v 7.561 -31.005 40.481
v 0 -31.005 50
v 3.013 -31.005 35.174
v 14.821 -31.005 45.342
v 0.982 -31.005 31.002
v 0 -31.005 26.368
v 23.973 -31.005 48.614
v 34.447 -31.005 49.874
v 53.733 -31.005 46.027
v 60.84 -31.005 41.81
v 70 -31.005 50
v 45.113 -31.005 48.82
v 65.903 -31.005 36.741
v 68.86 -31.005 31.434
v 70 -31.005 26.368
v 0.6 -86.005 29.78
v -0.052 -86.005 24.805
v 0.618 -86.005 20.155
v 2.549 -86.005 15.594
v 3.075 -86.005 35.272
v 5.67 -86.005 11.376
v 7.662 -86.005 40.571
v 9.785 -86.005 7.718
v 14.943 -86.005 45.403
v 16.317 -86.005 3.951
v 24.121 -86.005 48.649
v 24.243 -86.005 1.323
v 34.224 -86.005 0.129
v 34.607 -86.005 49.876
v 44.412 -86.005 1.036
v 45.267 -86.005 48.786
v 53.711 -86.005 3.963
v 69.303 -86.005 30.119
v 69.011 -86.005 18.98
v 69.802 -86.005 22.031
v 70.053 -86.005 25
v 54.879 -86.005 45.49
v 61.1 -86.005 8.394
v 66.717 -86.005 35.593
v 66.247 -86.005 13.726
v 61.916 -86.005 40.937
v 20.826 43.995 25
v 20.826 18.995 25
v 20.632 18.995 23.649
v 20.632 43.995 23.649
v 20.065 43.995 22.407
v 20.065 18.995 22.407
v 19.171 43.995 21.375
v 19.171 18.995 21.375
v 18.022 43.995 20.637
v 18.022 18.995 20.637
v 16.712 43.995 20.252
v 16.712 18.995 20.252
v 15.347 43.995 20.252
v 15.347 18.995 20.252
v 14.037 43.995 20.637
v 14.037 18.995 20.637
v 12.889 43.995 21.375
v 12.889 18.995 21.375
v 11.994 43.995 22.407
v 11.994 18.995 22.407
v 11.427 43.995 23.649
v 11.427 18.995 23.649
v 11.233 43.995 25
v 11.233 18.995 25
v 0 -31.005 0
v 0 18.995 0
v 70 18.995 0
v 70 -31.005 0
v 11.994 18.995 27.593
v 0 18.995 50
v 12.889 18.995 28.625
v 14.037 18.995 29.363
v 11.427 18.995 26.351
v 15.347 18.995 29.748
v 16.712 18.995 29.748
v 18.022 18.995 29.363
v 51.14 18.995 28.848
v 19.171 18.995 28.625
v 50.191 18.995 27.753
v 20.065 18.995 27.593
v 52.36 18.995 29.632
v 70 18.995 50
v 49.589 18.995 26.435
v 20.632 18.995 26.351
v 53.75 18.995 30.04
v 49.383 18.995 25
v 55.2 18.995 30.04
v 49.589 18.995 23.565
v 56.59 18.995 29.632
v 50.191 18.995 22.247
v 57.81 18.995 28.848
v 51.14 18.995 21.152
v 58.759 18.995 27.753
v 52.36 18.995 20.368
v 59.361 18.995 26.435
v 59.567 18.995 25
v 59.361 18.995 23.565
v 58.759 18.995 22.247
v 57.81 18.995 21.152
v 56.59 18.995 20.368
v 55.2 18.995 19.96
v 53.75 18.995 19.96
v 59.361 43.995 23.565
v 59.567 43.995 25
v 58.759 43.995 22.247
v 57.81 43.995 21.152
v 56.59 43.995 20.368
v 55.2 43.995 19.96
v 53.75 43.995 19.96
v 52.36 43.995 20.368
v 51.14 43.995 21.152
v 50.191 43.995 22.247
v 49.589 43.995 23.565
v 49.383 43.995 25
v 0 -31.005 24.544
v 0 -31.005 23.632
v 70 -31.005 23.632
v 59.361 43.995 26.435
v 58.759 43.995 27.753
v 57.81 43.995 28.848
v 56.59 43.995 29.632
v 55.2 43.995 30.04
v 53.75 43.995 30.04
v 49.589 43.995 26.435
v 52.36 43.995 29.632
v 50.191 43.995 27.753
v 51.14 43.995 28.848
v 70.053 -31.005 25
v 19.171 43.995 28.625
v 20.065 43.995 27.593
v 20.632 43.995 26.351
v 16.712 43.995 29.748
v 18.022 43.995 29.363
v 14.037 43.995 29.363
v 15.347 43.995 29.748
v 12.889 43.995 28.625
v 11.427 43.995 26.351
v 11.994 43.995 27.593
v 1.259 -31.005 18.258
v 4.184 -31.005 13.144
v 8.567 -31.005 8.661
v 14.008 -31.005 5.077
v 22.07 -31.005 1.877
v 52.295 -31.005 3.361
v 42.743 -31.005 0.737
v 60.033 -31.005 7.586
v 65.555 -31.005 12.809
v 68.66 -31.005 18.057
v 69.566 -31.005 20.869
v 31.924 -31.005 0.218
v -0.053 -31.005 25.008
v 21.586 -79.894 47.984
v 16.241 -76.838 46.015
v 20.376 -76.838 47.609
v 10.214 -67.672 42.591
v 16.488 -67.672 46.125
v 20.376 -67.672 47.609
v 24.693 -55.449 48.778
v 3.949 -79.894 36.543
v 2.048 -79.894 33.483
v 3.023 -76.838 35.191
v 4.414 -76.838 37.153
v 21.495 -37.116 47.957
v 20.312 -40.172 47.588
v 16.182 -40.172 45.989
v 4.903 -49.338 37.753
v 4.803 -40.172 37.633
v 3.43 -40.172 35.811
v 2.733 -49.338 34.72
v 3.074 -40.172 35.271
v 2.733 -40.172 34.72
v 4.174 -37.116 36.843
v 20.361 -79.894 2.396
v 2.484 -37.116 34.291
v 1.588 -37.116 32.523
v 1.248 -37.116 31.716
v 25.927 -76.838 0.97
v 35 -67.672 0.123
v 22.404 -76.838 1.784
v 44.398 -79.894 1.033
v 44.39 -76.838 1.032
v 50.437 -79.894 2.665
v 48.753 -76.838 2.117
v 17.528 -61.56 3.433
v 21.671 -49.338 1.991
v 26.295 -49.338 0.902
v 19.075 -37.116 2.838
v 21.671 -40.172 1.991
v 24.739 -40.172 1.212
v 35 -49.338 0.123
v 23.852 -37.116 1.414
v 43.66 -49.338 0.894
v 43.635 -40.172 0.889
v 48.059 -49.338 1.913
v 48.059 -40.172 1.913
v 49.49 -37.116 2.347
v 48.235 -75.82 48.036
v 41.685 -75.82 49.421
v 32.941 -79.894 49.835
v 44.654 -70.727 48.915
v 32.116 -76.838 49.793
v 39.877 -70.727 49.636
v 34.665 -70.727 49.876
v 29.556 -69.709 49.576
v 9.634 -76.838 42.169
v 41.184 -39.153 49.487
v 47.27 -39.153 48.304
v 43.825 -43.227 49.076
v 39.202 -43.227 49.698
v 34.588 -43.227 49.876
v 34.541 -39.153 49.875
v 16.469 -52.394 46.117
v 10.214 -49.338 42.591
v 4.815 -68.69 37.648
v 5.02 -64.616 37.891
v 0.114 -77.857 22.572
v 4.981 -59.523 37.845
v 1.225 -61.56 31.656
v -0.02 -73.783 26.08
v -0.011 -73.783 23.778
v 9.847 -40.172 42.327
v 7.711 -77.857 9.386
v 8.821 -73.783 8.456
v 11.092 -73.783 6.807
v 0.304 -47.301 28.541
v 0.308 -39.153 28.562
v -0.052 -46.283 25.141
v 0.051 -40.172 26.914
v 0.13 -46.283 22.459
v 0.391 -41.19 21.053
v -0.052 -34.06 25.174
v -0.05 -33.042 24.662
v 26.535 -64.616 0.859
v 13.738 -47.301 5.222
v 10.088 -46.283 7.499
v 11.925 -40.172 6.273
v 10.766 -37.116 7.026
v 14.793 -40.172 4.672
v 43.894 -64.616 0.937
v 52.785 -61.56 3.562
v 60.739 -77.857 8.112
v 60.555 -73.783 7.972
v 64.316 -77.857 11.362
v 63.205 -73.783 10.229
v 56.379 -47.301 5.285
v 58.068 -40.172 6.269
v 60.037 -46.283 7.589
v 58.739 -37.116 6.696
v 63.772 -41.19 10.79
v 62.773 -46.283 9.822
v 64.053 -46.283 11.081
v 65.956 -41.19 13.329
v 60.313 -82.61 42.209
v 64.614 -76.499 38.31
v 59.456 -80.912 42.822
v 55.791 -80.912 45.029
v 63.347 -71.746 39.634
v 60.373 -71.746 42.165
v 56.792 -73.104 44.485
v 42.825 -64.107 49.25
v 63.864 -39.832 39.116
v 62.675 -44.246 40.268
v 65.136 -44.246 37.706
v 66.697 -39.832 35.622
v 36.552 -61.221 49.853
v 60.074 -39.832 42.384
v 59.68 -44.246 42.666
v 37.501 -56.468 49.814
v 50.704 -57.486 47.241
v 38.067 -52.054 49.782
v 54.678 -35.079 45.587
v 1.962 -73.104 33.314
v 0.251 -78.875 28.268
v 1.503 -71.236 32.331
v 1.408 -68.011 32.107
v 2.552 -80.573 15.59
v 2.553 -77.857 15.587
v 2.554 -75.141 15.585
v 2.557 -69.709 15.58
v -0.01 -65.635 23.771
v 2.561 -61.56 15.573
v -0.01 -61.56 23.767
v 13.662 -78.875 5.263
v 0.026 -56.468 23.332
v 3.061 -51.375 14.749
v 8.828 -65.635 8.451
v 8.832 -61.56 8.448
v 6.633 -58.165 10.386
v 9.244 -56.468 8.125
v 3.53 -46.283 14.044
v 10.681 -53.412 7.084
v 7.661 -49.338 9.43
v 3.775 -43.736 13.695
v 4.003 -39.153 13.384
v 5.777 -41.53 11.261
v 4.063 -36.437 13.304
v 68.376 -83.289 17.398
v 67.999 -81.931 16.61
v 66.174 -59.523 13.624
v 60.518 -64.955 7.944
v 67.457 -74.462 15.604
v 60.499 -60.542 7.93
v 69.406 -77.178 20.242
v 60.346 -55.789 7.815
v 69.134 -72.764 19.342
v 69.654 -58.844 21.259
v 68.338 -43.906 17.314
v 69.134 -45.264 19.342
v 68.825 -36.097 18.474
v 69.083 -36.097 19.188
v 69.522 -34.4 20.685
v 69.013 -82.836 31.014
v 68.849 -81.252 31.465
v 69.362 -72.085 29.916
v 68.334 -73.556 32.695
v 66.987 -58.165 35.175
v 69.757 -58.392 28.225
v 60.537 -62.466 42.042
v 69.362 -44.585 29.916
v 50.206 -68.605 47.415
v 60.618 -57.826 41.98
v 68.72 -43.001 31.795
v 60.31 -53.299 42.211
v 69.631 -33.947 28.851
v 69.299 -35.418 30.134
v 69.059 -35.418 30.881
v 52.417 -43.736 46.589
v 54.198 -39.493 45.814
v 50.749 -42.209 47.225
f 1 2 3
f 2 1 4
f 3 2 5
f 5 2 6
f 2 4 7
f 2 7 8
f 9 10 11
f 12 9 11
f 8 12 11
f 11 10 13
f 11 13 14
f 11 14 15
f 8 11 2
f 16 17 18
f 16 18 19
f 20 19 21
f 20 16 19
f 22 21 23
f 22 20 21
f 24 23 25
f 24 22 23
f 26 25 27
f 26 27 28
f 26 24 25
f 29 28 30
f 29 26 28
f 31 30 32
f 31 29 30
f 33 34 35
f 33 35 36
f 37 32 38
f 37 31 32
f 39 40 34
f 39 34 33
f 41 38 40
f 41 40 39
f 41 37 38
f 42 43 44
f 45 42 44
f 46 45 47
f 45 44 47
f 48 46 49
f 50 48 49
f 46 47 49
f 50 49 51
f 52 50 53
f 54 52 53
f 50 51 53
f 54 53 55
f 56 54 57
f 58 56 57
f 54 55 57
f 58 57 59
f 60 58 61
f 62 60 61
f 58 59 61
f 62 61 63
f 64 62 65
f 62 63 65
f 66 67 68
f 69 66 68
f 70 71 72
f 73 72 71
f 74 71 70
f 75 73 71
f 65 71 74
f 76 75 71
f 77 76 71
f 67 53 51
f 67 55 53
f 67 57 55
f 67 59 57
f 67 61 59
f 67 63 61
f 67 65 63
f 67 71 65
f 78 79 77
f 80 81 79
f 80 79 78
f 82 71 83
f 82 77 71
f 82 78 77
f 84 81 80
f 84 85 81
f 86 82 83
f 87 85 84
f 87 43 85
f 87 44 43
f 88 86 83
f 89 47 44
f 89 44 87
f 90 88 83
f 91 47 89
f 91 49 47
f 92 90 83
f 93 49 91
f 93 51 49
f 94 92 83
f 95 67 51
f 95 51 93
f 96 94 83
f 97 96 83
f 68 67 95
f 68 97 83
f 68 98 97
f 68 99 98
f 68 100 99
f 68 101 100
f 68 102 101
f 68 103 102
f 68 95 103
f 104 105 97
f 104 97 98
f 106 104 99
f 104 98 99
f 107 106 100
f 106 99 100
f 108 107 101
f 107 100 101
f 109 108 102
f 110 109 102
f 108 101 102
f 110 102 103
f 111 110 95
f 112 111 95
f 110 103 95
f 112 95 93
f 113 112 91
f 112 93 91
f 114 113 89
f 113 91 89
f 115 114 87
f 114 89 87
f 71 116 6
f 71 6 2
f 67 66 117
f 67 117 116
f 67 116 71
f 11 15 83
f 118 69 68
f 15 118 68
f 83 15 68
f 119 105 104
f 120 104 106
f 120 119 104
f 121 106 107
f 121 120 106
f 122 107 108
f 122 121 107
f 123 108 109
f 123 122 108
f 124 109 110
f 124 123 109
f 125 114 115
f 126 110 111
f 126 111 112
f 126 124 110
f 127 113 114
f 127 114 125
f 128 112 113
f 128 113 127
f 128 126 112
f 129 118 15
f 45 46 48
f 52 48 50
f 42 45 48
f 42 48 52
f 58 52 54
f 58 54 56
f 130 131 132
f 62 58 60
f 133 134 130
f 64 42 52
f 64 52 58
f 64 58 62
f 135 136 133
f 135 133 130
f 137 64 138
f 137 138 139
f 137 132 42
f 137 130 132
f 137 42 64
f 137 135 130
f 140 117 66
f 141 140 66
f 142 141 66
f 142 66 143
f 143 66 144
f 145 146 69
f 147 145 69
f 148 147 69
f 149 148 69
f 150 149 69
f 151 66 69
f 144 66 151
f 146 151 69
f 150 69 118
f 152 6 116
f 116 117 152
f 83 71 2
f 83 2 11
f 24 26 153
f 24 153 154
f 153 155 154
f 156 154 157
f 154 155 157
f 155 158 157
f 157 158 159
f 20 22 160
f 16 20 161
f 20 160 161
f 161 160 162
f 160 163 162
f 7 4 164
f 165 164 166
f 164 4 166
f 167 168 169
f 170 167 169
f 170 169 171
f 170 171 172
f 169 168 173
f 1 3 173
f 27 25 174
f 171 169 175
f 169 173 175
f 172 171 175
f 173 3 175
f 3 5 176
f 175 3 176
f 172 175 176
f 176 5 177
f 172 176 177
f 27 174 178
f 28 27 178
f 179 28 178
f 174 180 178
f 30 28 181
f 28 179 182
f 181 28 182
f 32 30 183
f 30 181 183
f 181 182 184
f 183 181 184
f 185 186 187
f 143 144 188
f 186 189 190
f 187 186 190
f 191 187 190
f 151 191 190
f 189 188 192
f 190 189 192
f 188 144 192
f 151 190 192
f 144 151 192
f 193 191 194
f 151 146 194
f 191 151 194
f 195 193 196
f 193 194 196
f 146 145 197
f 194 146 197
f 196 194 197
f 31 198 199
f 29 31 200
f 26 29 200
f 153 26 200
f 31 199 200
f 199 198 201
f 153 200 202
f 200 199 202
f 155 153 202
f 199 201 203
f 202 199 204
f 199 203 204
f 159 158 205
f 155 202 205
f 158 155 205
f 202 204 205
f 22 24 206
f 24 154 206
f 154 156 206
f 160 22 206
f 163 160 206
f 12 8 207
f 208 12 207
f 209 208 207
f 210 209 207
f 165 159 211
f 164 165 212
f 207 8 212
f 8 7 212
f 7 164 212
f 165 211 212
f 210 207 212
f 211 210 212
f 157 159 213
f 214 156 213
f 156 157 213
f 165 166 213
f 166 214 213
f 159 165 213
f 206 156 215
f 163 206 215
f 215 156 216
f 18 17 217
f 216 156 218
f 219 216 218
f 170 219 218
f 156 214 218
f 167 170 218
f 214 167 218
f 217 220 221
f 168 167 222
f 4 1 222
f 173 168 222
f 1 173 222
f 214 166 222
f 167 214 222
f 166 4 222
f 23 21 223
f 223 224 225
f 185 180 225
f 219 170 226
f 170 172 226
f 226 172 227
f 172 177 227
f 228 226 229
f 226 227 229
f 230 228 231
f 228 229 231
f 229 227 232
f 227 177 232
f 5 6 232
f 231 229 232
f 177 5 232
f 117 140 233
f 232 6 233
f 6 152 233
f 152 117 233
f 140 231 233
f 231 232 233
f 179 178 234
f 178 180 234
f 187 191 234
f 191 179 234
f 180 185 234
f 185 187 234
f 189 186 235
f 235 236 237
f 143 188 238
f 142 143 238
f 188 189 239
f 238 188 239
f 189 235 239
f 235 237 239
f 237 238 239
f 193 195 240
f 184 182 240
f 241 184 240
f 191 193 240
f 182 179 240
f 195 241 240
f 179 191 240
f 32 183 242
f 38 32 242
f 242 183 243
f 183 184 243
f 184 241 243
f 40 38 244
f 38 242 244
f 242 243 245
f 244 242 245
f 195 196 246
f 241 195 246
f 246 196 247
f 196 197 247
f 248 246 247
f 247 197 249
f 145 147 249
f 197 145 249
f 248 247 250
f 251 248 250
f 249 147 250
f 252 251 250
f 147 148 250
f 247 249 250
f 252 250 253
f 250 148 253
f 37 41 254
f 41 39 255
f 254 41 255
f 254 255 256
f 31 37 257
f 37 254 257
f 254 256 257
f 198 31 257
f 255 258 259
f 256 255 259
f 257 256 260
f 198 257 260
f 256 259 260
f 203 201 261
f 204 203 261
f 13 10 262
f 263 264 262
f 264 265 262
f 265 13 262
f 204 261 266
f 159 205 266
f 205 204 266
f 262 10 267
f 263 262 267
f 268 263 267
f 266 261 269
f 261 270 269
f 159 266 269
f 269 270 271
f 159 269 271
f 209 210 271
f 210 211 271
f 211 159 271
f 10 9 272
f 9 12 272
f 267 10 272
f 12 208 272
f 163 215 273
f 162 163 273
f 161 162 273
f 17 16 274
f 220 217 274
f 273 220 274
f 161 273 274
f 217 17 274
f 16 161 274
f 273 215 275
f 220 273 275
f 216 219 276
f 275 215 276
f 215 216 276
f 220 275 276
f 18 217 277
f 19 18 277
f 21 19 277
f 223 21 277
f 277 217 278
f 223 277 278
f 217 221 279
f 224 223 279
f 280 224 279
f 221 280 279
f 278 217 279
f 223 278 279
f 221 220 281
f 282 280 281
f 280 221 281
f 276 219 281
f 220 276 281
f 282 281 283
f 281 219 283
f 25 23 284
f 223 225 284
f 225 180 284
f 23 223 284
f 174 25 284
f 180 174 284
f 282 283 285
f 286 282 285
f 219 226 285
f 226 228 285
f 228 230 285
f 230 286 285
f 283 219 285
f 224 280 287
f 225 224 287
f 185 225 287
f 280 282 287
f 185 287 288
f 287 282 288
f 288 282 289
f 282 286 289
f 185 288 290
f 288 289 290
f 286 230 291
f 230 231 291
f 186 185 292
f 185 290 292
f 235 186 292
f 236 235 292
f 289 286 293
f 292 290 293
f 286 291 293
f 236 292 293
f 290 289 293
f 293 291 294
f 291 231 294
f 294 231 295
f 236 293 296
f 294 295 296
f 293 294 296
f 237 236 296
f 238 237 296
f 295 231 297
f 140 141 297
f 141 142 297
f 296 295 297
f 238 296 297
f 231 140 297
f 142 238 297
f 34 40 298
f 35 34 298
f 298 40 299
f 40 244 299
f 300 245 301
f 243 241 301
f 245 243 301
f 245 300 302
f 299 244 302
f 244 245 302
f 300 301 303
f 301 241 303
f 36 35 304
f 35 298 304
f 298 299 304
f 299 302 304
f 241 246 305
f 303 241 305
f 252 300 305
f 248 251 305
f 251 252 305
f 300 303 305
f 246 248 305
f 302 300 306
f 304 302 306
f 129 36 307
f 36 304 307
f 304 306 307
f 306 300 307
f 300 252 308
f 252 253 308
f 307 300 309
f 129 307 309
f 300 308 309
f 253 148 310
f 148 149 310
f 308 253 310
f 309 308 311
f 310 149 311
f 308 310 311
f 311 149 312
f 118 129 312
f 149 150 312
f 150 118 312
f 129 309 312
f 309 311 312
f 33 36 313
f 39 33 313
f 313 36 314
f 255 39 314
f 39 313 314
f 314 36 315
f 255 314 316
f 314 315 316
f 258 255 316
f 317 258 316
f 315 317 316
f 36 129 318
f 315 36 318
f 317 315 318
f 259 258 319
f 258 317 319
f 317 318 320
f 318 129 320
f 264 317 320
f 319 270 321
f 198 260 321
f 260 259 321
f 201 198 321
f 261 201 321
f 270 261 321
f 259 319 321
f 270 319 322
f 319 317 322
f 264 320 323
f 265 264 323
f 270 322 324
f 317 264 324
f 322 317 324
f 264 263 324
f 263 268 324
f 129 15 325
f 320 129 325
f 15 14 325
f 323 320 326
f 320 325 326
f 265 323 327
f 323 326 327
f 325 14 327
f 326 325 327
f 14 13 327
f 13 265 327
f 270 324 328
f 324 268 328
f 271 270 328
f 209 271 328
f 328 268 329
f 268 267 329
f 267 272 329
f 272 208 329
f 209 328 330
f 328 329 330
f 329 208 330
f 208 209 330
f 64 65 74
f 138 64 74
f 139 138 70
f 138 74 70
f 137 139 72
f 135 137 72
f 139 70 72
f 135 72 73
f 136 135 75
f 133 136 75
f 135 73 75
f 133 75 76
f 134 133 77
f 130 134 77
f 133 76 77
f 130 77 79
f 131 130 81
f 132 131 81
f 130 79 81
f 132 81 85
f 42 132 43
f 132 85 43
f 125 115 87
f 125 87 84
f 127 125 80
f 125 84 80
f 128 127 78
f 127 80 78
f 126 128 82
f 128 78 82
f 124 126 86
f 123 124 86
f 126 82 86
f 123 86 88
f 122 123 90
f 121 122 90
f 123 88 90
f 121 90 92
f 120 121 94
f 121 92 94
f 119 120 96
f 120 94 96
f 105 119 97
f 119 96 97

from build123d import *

# Parameters (mm, degrees)
F0_W     = 70
F0_H     = 50
F1_DEPTH = 50
F3_DEPTH = 55
F5_DEPTH = 25


with BuildPart() as f1:
    # F0 (on Top) → F1 (new body)
    with BuildSketch(Plane.XY):
        with Locations((35, -6.004873)):
            Rectangle(F0_W, F0_H)
    extrude(amount=F1_DEPTH)

    # F2 (on face) → F3 (join)
    with BuildSketch(Plane.XZ.offset(31.004873)):
        with BuildLine():
            add(Edge.make_bspline(
                [(35, 0.122521), (70.053019, 0.122521), (70.053019, 25)],
                knots=[4.712389, 4.712389, 4.712389, 6.283185, 6.283185, 6.283185], degree=2, weights=[1, 0.707107, 1]))
            add(Edge.make_bspline(
                [(70.053019, 25), (70.053019, 85.059548), (10.213773, 42.591034), (-49.625473, 0.122521), (35, 0.122521)],
                knots=[0, 0, 0, 2.356194, 2.356194, 4.712389, 4.712389, 4.712389], degree=2, weights=[1, 0.382683, 1, 0.382683, 1]))
        make_face()
    extrude(amount=F3_DEPTH)

    # F4 (on face) → F5 (join)
    with BuildSketch(Plane(origin=(0, 18.995127, 0), x_dir=(-1, 0, 0), z_dir=(0, 1, 0))):
        with BuildLine():
            ThreePointArc((-49.382868, 25), (-54.47498, 30.092111), (-59.567091, 25))
            Line((-59.567091, 25), (-49.382868, 25))
        make_face()
        with BuildLine():
            ThreePointArc((-11.232963, 25), (-16.029716, 29.796753), (-20.826468, 25))
            Line((-20.826468, 25), (-11.232963, 25))
        make_face()
        with BuildLine():
            Line((-11.232963, 25), (-20.826468, 25))
            ThreePointArc((-20.826468, 25), (-16.029716, 20.203247), (-11.232963, 25))
        make_face()
        with BuildLine():
            Line((-49.382868, 25), (-59.567091, 25))
            ThreePointArc((-59.567091, 25), (-54.47498, 19.907889), (-49.382868, 25))
        make_face()
    extrude(amount=F5_DEPTH)


solid = f1.part
